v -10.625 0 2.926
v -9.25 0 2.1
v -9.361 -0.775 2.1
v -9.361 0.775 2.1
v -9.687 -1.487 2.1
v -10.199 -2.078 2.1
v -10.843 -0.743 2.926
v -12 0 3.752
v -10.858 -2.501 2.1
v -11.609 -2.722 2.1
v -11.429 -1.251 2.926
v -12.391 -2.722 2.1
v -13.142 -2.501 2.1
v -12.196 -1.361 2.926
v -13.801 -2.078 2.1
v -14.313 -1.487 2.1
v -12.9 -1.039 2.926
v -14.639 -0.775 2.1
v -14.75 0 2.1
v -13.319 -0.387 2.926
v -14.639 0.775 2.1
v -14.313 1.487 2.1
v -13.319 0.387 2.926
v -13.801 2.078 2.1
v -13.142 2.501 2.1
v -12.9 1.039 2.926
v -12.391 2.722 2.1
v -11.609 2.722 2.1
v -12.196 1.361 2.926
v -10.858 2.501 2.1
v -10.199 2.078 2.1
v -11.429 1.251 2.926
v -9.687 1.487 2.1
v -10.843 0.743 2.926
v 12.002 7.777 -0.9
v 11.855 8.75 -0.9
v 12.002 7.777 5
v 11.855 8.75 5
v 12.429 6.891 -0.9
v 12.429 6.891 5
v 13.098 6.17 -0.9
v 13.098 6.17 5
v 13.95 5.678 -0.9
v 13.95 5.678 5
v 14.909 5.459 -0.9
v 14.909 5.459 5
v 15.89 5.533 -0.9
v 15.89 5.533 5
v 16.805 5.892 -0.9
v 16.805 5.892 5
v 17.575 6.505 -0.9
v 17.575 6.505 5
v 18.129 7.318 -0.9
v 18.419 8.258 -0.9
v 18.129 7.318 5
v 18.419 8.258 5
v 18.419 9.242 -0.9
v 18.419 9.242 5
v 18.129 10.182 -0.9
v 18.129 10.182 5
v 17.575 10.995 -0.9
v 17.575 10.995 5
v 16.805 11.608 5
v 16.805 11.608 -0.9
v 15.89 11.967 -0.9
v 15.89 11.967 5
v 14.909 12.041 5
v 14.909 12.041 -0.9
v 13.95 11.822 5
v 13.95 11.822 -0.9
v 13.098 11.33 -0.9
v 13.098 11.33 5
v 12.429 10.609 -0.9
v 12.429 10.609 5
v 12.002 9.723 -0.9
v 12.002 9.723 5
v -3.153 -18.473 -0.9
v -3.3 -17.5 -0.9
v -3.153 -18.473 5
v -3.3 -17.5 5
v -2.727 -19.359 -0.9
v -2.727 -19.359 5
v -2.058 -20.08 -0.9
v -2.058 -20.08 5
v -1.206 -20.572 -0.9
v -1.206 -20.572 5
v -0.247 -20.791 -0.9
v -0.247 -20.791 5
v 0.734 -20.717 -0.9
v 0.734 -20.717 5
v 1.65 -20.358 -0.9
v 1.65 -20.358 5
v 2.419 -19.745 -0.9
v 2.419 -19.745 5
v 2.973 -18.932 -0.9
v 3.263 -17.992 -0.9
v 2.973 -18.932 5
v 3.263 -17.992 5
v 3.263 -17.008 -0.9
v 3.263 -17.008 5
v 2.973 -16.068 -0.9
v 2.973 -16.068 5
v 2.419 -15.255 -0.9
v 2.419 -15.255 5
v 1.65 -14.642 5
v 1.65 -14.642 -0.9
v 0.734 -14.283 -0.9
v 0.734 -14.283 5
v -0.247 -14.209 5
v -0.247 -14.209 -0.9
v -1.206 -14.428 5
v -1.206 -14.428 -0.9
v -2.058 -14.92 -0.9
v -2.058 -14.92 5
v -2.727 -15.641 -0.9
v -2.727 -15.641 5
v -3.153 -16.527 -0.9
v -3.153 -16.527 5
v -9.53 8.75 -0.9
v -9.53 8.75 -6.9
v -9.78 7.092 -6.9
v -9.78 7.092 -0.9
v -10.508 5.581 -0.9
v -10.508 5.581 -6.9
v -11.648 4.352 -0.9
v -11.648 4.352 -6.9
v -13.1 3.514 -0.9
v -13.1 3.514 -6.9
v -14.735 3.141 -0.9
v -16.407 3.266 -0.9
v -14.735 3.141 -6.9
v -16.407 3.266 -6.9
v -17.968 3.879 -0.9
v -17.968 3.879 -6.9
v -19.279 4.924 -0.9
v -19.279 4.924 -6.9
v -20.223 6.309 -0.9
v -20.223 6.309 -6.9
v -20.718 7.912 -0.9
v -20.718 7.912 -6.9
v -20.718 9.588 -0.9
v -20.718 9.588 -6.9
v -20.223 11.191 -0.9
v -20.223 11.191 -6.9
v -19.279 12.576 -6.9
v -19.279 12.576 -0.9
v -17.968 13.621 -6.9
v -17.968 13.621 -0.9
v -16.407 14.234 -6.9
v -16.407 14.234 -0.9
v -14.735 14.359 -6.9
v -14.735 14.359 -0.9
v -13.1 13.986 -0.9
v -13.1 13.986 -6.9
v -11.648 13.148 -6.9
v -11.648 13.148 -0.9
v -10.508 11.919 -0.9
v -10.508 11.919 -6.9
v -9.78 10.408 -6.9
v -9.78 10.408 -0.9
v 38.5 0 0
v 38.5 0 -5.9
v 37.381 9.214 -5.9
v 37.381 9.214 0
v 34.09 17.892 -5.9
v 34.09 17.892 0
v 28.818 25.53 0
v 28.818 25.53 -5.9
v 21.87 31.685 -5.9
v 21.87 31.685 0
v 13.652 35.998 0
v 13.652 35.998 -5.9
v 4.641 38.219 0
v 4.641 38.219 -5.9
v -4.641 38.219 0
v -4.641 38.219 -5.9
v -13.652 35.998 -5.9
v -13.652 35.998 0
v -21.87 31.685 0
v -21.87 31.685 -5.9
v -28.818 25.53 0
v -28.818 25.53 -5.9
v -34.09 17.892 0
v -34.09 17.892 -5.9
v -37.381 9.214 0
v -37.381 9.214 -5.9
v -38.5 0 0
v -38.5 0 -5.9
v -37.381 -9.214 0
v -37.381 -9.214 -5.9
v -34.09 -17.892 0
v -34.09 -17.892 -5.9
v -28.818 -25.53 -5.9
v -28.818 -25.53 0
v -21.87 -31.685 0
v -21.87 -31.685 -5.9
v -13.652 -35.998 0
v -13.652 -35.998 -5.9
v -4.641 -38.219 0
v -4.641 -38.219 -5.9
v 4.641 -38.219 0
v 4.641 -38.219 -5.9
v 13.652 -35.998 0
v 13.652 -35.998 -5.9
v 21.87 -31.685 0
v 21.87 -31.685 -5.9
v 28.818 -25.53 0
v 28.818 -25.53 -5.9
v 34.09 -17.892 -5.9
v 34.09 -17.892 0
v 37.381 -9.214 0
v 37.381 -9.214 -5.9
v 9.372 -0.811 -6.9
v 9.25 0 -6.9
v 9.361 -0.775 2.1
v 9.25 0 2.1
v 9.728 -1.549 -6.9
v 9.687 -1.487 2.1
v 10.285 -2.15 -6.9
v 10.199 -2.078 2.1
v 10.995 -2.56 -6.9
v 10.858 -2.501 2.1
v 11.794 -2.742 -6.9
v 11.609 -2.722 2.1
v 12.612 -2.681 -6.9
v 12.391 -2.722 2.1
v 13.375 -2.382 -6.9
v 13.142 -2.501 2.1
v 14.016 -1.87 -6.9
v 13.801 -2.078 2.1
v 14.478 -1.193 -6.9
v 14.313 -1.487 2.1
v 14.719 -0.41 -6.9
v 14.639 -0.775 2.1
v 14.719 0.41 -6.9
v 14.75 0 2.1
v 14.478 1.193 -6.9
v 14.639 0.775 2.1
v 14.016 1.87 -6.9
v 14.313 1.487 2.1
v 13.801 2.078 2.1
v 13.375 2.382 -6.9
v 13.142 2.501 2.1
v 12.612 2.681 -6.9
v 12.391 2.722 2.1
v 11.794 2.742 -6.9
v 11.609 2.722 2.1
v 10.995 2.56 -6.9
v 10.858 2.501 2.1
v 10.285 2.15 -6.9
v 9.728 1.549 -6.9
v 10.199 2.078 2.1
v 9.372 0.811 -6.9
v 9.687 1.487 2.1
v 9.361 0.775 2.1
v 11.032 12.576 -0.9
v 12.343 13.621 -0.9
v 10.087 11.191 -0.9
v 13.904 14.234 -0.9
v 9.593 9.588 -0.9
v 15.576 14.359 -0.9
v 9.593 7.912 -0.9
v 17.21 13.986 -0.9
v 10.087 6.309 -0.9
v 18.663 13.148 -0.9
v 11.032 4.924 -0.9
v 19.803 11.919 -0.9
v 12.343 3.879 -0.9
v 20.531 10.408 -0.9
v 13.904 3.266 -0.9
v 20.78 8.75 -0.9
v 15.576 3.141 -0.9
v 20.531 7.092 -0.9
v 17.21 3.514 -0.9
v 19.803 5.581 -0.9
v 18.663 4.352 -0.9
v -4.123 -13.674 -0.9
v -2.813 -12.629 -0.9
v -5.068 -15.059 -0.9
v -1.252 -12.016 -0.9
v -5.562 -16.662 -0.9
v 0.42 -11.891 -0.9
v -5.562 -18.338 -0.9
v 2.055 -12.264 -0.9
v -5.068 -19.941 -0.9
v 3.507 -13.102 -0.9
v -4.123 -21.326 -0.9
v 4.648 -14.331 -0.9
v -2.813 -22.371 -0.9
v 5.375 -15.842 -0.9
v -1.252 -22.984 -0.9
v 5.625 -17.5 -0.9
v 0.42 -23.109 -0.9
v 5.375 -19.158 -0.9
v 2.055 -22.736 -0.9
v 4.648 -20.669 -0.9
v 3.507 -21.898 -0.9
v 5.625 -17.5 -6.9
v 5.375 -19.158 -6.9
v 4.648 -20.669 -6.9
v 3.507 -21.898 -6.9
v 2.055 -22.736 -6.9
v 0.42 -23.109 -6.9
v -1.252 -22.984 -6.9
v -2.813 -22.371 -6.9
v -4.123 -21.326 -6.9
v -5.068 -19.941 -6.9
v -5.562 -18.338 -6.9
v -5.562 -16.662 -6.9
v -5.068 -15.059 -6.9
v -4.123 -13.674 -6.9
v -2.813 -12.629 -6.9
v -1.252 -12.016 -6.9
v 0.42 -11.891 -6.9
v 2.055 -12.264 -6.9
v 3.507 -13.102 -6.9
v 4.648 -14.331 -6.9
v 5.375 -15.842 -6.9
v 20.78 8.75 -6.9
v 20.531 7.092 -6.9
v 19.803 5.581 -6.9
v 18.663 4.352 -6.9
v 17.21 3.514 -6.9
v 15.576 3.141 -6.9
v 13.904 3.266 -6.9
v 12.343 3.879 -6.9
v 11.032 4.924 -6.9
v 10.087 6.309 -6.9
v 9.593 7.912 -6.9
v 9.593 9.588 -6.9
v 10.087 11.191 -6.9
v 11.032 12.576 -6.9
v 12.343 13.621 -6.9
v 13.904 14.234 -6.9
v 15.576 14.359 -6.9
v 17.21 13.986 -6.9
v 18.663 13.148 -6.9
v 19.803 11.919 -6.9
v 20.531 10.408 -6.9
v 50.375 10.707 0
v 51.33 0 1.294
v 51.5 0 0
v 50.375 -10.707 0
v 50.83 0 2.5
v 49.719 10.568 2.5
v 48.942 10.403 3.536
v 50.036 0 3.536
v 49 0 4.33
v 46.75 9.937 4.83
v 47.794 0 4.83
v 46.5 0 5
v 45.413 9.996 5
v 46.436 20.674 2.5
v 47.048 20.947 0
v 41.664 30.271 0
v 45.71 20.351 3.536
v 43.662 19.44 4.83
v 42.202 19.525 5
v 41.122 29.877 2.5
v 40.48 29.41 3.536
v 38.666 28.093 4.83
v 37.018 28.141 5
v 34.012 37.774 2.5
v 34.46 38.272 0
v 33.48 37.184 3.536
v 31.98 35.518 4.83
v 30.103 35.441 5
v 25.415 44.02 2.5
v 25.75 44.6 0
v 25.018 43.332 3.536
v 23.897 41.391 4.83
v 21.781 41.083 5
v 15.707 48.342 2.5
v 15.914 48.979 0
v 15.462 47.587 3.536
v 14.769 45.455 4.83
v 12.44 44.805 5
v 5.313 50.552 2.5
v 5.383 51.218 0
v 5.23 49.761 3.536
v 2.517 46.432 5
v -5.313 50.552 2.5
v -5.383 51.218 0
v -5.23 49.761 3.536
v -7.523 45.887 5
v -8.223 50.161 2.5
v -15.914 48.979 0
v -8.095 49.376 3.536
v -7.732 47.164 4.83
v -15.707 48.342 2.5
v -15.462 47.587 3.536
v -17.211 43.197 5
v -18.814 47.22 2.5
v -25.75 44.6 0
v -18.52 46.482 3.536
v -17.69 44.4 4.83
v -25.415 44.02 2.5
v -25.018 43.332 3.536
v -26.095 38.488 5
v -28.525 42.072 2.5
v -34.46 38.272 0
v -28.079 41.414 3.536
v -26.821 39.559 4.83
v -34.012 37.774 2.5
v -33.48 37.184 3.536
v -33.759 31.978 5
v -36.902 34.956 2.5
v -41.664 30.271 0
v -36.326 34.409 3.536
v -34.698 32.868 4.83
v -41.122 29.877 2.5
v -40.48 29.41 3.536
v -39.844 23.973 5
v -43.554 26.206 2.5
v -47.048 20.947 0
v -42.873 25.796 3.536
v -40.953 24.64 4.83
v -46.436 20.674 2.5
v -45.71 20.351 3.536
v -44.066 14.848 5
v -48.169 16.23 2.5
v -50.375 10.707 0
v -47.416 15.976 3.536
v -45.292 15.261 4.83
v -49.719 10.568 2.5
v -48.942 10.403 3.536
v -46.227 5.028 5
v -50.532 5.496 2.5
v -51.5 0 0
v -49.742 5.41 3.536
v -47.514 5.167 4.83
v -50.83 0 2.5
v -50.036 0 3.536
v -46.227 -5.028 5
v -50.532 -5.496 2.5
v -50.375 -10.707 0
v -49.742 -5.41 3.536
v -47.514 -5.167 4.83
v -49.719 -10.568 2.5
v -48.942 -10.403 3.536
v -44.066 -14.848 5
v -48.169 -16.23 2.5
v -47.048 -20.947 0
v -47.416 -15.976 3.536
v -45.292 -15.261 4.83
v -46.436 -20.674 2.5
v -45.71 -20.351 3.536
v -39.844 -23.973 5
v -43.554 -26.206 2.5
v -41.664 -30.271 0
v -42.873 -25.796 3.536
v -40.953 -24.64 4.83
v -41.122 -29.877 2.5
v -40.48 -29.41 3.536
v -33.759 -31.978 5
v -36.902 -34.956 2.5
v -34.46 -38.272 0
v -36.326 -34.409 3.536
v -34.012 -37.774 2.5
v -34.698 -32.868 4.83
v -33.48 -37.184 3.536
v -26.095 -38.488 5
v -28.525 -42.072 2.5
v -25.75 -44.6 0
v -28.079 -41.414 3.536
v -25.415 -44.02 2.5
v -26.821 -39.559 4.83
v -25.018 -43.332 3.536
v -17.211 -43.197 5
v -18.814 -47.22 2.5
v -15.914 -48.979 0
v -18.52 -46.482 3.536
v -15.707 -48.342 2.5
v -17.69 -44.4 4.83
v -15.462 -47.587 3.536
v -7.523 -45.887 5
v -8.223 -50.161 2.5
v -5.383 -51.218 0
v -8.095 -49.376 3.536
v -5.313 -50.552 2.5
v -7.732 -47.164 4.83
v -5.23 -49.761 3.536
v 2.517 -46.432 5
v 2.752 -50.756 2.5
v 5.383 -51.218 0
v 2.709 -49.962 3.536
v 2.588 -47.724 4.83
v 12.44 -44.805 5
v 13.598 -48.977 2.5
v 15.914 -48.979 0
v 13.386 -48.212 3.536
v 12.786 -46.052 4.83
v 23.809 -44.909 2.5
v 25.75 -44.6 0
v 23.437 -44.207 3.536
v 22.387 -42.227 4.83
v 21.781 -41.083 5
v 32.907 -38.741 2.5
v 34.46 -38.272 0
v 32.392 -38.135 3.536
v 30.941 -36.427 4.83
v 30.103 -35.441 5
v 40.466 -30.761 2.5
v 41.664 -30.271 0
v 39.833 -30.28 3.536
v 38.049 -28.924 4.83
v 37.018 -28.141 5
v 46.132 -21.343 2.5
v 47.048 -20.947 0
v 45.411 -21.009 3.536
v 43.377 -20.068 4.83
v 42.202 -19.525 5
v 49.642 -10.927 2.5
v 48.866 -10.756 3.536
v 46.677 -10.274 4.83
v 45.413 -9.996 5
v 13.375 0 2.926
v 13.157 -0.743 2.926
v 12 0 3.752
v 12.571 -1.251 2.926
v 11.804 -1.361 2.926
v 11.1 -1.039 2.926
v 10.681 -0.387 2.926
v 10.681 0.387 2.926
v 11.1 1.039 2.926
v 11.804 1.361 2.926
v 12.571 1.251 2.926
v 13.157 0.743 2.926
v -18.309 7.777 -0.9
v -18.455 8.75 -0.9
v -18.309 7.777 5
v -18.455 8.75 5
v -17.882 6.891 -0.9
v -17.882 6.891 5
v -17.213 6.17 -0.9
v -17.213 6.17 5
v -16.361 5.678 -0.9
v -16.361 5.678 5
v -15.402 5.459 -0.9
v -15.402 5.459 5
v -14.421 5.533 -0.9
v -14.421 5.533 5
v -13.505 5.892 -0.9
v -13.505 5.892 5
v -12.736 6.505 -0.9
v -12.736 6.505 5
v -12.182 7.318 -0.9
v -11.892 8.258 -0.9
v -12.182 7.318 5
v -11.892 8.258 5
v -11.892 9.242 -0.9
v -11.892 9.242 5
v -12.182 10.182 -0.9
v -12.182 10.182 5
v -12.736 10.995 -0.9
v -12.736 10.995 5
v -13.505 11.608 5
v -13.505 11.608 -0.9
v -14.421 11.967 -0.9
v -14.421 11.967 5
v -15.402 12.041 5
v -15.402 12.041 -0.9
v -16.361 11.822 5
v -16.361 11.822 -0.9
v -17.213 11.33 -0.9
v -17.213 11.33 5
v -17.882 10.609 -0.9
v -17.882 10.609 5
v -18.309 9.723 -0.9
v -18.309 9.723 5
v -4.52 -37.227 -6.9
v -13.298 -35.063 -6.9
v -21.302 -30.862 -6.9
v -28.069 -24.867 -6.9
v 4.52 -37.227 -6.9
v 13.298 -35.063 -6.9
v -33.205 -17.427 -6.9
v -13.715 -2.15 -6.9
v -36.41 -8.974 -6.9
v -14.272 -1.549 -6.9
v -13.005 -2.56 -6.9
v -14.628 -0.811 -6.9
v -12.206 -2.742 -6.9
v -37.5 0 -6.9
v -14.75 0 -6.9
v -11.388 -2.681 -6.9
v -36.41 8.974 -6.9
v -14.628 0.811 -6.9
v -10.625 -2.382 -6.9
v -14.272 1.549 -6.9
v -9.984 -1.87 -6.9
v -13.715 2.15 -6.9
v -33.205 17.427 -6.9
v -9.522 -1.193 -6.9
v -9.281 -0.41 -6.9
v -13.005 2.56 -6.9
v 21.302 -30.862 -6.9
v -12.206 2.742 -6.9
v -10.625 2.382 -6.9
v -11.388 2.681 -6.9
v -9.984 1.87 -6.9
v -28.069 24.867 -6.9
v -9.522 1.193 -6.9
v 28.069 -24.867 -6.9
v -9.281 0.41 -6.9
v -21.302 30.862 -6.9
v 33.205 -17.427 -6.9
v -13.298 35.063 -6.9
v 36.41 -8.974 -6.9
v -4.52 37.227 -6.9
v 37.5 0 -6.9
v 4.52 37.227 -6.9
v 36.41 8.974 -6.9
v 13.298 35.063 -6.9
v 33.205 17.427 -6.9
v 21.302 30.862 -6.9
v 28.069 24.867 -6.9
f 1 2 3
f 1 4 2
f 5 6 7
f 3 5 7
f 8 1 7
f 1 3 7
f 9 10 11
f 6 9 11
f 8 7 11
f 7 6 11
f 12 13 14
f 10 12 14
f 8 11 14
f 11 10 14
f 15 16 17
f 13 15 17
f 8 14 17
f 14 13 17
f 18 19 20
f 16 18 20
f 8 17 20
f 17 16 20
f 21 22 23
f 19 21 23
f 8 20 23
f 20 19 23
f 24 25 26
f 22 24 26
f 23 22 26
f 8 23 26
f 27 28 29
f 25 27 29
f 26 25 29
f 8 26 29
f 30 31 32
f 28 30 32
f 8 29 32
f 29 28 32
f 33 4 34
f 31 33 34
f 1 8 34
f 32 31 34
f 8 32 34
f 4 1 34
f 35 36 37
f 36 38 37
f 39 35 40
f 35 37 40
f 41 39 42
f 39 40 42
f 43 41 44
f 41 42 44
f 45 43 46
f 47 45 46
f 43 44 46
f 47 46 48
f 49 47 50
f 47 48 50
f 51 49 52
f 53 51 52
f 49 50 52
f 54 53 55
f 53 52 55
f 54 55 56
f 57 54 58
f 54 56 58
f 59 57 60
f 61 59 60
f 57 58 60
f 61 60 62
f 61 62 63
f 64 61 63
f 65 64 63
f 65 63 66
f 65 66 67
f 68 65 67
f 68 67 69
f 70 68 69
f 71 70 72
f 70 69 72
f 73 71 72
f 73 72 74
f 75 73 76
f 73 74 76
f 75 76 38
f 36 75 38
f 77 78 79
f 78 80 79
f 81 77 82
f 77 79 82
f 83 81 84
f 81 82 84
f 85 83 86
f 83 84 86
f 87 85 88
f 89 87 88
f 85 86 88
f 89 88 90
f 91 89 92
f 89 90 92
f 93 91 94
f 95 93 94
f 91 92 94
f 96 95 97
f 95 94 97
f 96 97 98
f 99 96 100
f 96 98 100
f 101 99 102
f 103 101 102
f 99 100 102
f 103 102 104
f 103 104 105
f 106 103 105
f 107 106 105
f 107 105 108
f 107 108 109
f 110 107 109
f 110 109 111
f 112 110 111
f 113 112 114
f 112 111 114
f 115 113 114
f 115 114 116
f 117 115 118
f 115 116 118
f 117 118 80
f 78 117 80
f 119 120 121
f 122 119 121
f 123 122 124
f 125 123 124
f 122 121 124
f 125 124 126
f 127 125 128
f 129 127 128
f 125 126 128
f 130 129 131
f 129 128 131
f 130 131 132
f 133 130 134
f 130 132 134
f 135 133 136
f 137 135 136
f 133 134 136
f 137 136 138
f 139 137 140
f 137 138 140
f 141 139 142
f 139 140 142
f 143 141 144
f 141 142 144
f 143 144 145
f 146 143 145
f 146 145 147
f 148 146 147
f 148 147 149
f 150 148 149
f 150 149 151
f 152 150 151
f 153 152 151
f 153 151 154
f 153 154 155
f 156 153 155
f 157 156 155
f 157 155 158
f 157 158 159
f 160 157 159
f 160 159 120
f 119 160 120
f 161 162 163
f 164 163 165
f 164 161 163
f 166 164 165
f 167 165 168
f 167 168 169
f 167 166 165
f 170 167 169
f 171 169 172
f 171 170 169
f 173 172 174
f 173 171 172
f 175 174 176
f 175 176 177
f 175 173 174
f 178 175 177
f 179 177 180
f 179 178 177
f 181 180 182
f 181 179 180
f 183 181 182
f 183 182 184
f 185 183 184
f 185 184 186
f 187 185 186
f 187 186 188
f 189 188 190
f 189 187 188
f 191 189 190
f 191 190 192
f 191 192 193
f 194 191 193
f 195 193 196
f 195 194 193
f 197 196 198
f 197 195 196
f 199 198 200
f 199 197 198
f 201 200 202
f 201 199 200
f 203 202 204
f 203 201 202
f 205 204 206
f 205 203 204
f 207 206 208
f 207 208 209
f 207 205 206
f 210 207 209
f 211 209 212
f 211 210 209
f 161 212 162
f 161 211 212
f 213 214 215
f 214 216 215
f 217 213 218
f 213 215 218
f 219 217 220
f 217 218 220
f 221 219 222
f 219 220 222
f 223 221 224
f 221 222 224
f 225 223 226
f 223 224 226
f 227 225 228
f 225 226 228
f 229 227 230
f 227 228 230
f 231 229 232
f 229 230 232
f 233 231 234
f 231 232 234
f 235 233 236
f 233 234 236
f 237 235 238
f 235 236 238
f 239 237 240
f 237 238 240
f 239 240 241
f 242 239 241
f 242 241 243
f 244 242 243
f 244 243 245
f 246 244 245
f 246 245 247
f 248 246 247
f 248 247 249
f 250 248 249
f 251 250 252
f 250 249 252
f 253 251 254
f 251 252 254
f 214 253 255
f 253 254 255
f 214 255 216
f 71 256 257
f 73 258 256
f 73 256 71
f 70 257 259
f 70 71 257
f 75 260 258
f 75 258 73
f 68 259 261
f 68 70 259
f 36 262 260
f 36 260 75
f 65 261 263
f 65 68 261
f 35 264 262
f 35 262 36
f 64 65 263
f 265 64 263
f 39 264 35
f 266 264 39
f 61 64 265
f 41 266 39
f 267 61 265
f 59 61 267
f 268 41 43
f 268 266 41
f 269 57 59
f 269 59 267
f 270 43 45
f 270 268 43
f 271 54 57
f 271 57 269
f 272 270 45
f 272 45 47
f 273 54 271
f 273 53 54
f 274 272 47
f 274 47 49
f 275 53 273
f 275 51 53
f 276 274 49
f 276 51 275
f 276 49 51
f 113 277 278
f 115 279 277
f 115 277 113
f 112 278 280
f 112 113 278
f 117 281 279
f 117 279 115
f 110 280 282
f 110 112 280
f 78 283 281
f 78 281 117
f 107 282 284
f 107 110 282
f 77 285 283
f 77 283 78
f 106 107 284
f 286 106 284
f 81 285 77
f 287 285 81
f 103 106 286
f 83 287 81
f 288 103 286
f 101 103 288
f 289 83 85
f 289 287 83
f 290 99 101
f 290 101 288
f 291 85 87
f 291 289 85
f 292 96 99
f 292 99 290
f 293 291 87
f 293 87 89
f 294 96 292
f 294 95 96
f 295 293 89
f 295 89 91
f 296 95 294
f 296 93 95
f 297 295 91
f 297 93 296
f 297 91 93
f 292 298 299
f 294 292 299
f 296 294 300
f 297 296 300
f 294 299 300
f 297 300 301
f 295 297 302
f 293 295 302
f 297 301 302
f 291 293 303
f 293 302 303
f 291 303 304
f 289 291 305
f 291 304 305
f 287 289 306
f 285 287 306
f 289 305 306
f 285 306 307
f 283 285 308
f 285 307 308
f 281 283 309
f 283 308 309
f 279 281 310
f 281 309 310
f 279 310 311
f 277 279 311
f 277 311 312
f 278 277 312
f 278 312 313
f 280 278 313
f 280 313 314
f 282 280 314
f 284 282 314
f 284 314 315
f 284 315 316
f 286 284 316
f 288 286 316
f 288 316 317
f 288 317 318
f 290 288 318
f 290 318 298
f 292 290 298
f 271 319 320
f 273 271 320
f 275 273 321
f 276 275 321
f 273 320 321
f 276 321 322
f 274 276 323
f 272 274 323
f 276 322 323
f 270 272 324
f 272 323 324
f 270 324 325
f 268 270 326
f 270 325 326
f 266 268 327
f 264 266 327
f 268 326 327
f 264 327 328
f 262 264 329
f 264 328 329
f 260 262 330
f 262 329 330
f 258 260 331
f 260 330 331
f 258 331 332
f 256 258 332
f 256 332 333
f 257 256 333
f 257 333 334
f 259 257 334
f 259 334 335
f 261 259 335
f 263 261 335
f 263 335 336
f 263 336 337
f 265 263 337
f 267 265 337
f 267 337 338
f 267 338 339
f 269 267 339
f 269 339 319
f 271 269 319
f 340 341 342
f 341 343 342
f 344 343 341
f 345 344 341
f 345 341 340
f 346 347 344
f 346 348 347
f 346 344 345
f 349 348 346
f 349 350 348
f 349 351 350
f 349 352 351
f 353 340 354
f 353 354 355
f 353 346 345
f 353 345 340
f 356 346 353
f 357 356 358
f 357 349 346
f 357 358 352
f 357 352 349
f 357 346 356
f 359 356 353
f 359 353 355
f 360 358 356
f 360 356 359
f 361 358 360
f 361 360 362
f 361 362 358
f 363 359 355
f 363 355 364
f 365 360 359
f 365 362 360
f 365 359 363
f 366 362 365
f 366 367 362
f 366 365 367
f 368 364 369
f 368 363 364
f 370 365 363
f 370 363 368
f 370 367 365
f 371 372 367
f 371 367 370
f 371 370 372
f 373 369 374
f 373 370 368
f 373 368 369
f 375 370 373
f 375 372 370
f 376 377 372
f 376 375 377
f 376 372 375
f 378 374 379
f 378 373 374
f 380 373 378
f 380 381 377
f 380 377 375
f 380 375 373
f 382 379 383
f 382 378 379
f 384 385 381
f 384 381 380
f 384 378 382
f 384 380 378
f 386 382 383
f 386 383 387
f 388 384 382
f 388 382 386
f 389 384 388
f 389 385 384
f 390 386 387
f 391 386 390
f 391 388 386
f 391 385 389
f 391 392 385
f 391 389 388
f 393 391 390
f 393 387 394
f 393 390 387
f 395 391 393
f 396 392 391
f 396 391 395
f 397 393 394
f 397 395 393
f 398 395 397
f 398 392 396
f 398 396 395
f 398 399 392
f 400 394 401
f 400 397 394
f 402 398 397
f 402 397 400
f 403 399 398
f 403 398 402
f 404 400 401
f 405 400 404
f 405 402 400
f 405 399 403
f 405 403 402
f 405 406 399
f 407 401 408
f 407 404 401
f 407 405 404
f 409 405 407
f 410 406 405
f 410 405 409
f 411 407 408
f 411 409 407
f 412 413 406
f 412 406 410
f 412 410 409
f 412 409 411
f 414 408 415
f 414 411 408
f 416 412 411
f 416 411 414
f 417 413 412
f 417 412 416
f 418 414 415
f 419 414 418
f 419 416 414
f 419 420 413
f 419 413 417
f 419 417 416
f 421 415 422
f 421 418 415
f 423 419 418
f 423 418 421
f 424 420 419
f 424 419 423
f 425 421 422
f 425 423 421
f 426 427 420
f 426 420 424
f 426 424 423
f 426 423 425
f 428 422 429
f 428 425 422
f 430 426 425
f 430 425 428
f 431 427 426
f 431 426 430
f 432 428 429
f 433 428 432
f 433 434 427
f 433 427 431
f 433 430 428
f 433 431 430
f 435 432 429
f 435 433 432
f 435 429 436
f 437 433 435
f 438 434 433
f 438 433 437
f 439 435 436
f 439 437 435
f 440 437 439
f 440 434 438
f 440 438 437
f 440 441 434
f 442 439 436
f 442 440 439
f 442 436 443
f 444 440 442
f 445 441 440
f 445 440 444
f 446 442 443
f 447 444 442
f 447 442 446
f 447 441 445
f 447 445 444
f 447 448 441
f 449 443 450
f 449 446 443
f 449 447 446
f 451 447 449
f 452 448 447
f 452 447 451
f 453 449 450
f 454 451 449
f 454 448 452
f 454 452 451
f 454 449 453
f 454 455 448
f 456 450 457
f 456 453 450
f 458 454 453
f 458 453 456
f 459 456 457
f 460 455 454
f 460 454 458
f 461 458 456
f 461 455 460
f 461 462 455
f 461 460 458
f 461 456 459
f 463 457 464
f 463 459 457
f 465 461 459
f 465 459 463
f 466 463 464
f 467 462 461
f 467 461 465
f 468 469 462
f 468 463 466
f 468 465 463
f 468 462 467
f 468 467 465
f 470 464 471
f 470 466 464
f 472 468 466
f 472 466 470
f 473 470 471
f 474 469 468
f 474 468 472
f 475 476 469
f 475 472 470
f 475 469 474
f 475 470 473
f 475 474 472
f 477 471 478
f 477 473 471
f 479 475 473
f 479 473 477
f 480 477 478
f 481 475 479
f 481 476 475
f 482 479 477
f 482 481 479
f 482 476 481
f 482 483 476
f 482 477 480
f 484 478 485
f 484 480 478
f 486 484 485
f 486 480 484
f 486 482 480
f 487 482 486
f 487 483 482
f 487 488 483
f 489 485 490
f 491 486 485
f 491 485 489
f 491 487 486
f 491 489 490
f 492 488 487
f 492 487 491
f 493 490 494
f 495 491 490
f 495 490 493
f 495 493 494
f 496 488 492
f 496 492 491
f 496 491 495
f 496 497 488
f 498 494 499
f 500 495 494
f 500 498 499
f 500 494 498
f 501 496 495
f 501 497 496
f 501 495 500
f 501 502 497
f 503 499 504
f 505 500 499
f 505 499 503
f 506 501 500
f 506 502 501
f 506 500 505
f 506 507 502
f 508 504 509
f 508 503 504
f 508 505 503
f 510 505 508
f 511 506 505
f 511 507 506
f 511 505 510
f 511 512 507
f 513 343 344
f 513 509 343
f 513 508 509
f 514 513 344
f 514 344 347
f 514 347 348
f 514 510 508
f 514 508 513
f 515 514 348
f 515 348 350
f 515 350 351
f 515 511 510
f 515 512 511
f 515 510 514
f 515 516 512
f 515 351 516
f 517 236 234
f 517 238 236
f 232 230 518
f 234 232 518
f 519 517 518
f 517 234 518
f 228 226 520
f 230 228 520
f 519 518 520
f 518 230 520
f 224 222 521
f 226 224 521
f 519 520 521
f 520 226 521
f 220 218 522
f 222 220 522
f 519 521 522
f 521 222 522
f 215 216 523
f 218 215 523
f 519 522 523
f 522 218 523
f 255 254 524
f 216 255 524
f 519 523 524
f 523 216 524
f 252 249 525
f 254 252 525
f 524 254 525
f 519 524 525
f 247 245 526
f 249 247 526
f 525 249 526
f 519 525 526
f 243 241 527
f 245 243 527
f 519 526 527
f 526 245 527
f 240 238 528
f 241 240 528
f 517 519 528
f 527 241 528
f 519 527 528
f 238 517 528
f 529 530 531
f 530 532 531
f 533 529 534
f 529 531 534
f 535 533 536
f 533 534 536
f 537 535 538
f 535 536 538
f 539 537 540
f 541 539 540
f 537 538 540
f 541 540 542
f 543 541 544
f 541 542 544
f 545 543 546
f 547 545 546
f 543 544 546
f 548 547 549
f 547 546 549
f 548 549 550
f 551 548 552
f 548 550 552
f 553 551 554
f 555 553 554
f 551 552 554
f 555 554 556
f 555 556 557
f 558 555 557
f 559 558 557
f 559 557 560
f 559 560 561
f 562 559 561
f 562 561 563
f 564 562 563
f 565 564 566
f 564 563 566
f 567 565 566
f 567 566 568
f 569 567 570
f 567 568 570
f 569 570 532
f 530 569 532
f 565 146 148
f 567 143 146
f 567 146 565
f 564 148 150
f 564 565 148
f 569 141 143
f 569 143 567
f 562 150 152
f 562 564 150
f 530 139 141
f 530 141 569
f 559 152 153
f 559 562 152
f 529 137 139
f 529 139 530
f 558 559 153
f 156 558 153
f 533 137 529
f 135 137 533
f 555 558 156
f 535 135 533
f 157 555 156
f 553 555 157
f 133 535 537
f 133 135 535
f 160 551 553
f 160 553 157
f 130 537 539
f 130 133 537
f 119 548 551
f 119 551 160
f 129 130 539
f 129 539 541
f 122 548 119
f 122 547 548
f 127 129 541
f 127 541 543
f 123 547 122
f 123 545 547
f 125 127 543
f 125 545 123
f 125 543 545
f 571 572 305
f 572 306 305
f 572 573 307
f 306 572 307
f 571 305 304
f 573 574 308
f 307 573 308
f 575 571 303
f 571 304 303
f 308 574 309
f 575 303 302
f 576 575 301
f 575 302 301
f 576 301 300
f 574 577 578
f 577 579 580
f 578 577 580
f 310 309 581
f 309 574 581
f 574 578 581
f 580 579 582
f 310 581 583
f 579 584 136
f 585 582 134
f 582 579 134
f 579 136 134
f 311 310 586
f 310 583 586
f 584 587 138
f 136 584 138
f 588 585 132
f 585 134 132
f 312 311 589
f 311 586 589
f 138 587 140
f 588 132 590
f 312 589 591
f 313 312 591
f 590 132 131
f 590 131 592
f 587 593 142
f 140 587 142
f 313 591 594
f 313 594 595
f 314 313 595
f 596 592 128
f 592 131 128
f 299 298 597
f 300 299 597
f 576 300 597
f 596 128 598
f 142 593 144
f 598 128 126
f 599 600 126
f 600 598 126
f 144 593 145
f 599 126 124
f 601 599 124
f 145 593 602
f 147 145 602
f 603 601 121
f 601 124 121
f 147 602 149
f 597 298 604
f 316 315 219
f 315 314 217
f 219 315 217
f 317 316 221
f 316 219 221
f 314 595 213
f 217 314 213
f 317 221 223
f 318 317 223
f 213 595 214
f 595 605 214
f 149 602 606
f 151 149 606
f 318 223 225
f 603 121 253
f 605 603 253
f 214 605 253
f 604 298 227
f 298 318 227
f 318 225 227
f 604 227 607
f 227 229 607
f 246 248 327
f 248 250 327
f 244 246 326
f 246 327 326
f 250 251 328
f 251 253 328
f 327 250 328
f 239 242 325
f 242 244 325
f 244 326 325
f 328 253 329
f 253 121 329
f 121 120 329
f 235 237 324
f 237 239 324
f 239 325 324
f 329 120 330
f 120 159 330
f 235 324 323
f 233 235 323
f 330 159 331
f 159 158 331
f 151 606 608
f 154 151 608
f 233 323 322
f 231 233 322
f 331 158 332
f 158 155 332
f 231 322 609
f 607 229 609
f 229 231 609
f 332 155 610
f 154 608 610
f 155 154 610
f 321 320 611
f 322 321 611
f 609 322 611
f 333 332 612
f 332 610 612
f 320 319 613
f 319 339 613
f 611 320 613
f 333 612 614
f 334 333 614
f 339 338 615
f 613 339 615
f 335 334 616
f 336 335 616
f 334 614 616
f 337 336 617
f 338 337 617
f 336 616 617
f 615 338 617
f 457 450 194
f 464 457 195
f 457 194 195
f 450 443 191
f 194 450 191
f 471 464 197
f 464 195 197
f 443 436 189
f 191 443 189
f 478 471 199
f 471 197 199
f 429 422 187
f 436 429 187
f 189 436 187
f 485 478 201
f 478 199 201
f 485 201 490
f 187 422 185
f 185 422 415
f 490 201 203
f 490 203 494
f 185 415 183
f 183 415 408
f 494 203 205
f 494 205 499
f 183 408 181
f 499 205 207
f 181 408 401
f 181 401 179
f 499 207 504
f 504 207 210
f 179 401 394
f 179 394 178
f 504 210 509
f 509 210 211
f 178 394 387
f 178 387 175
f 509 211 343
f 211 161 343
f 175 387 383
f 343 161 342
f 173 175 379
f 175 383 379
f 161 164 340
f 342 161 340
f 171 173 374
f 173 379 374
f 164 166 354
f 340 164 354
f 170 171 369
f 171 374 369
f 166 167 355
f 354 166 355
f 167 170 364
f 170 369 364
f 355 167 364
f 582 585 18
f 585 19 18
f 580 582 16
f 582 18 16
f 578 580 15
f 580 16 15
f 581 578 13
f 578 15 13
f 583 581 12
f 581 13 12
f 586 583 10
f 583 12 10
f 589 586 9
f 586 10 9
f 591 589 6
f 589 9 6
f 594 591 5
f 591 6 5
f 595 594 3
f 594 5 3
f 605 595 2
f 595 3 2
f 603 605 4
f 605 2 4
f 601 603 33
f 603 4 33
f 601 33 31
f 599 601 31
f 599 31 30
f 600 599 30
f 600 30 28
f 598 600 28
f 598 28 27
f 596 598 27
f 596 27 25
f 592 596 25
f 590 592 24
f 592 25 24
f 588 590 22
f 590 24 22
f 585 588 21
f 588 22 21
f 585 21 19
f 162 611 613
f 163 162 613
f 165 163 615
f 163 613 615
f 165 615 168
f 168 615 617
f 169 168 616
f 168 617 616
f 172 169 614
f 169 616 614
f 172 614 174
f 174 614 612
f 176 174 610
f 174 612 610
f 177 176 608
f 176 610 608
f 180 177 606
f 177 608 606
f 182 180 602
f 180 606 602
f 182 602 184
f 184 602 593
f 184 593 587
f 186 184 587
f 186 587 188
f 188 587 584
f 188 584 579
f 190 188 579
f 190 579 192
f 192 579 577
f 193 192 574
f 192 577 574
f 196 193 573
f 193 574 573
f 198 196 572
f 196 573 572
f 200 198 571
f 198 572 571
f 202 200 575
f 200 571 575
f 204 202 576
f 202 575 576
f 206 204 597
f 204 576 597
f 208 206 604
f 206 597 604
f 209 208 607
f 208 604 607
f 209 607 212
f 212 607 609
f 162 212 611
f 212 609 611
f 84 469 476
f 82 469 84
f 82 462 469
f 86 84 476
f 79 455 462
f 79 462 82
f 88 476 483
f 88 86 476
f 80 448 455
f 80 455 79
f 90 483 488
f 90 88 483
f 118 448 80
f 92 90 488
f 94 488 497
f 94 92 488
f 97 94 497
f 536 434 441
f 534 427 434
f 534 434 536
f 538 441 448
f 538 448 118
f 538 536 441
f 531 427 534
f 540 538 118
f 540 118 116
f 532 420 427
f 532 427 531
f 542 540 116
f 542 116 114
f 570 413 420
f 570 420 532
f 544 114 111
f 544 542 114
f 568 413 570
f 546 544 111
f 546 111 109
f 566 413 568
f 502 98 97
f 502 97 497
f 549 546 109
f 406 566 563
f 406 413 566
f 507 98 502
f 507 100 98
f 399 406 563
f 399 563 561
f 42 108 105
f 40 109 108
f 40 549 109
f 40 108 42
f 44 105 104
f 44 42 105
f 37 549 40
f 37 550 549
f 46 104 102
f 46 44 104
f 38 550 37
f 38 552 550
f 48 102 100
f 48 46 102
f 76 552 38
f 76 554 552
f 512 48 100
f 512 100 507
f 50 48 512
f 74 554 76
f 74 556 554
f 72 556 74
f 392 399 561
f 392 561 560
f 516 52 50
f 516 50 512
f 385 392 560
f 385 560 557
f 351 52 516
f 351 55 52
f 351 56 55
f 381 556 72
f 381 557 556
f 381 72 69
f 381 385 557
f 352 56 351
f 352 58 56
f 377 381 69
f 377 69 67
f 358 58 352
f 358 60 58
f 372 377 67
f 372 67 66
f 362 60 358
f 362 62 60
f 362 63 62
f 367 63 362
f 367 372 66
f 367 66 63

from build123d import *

# Parameters (mm, degrees)
F0_R           = 38.5
F1_DEPTH       = 6.9
F0_R_2         = 51.5
F2_DEPTH       = 5
F4_D           = 6.6
F4_CBORE_D     = 11.25
F4_CBORE_DEPTH = 6
F6_D           = 5.5
F6_DEPTH       = 9
F6_TIP         = 1.6523667023
F7_R           = 4.99999
F8_SIZE        = 1


# Not quite as in the source:
# - a fillet or chamfer is up to 0.001 mm smaller than in the source, because OpenCascade refuses the exact size


with BuildPart() as f1:
    # F0 (on Top) → F1 (new body)
    with BuildSketch(Plane.XY):
        Circle(F0_R)
    extrude(amount=-F1_DEPTH)

    # F0 (on Top) → F2 (join)
    with BuildSketch(Plane.XY):
        Circle(F0_R_2)
        Circle(F0_R, mode=Mode.SUBTRACT)
        Circle(F0_R)
    extrude(amount=F2_DEPTH)

    # F4 (through all)
    with Locations(Plane(origin=(0, 0, -6.9), x_dir=(1, 0, 0), z_dir=(0, 0, -1))):
        with Locations((-15.1554445662, -8.75), (0, 17.5), (15.1554445662, -8.75)):
            CounterBoreHole(F4_D / 2, F4_CBORE_D / 2, F4_CBORE_DEPTH)

    # F6
    with Locations(Plane(origin=(0, 0, -6.9), x_dir=(1, 0, 0), z_dir=(0, 0, -1))):
        with Locations((-12, 0), (12, 0)):
            Hole(F6_D / 2, depth=F6_DEPTH)
            with Locations((0, 0, -(F6_DEPTH + F6_TIP / 2))):  # 118° drill point
                Cone(0, F6_D / 2, F6_TIP, mode=Mode.SUBTRACT)

    # F7 (radius 5 in the source; OpenCascade refuses exactly that, so slightly less here)
    f7_edges = [f1.edges().sort_by_distance(p)[0] for p in [
        (-51.5, 0, 5),
    ]]
    fillet(f7_edges, radius=F7_R)

    # F8
    f8_edges = [f1.edges().sort_by_distance(p)[0] for p in [
        (-38.5, 0, -6.9),
    ]]
    chamfer(f8_edges, length=F8_SIZE)


solid = f1.part
